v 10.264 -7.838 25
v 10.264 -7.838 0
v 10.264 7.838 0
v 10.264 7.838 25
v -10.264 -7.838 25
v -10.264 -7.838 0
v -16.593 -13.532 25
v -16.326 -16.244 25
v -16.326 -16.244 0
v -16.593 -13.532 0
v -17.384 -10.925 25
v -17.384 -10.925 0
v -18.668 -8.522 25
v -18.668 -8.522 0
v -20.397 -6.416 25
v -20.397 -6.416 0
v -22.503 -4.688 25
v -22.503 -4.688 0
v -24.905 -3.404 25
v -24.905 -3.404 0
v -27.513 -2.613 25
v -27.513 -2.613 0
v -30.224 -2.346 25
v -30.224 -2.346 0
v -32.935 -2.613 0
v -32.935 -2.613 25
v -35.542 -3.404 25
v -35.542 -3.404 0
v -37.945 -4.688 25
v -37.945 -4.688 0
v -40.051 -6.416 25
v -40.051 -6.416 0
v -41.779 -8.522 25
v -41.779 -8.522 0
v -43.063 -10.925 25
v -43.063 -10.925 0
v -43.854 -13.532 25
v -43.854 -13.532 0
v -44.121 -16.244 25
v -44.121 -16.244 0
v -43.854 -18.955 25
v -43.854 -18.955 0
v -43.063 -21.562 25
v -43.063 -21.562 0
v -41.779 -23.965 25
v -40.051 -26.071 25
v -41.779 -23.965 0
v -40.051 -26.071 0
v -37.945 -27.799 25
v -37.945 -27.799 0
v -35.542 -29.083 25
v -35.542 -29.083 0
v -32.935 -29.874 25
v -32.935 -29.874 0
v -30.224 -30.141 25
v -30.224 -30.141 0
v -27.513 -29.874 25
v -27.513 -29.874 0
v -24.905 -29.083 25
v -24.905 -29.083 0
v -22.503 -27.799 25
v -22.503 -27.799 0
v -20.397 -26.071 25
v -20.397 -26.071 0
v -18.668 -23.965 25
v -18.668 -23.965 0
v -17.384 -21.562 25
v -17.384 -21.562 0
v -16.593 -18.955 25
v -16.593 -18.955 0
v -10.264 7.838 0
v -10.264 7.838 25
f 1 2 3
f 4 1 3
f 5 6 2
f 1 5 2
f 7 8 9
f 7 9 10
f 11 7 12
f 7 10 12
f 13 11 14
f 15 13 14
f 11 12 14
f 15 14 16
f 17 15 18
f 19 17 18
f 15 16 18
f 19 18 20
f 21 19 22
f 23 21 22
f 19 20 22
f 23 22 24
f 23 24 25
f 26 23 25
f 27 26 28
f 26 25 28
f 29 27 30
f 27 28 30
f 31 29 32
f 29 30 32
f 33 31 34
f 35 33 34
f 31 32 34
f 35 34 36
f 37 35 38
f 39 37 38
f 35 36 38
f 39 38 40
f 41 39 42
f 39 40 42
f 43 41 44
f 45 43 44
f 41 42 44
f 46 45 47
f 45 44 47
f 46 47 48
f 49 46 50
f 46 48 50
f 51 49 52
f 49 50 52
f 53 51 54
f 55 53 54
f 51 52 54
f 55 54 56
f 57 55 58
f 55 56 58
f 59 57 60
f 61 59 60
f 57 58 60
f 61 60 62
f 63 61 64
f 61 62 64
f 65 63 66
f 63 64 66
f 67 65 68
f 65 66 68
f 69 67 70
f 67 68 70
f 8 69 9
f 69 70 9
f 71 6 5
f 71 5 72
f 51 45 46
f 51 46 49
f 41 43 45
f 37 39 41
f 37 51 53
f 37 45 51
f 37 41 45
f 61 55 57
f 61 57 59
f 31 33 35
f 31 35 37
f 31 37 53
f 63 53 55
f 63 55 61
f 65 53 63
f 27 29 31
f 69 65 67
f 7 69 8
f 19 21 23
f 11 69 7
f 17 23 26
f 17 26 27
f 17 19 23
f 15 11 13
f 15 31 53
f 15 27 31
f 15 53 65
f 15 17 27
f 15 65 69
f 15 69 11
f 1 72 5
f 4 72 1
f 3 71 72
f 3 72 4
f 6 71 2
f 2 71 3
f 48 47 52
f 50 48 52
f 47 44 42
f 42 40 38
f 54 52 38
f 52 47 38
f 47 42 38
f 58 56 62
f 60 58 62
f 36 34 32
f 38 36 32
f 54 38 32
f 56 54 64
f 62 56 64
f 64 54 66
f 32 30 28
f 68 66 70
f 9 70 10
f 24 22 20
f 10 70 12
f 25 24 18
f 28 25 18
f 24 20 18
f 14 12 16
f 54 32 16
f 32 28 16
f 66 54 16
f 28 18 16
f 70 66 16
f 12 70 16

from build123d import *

# Parameters (mm, degrees)
F0_W     = 20.527252
F0_H     = 15.675356
F1_DEPTH = 25
F2_R     = 13.897559
F3_DEPTH = 25


with BuildPart() as f1:
    # F0 (on Top) → F1 (new body)
    with BuildSketch(Plane.XY):
        Rectangle(F0_W, F0_H)
    extrude(amount=F1_DEPTH)


with BuildPart() as f3:
    # F2 (on Top) → F3 (new body)
    with BuildSketch(Plane.XY):
        with Locations((-30.223787, -16.243508)):
            Circle(F2_R)
    extrude(amount=F3_DEPTH)


solid = Compound([f1.part, f3.part])
